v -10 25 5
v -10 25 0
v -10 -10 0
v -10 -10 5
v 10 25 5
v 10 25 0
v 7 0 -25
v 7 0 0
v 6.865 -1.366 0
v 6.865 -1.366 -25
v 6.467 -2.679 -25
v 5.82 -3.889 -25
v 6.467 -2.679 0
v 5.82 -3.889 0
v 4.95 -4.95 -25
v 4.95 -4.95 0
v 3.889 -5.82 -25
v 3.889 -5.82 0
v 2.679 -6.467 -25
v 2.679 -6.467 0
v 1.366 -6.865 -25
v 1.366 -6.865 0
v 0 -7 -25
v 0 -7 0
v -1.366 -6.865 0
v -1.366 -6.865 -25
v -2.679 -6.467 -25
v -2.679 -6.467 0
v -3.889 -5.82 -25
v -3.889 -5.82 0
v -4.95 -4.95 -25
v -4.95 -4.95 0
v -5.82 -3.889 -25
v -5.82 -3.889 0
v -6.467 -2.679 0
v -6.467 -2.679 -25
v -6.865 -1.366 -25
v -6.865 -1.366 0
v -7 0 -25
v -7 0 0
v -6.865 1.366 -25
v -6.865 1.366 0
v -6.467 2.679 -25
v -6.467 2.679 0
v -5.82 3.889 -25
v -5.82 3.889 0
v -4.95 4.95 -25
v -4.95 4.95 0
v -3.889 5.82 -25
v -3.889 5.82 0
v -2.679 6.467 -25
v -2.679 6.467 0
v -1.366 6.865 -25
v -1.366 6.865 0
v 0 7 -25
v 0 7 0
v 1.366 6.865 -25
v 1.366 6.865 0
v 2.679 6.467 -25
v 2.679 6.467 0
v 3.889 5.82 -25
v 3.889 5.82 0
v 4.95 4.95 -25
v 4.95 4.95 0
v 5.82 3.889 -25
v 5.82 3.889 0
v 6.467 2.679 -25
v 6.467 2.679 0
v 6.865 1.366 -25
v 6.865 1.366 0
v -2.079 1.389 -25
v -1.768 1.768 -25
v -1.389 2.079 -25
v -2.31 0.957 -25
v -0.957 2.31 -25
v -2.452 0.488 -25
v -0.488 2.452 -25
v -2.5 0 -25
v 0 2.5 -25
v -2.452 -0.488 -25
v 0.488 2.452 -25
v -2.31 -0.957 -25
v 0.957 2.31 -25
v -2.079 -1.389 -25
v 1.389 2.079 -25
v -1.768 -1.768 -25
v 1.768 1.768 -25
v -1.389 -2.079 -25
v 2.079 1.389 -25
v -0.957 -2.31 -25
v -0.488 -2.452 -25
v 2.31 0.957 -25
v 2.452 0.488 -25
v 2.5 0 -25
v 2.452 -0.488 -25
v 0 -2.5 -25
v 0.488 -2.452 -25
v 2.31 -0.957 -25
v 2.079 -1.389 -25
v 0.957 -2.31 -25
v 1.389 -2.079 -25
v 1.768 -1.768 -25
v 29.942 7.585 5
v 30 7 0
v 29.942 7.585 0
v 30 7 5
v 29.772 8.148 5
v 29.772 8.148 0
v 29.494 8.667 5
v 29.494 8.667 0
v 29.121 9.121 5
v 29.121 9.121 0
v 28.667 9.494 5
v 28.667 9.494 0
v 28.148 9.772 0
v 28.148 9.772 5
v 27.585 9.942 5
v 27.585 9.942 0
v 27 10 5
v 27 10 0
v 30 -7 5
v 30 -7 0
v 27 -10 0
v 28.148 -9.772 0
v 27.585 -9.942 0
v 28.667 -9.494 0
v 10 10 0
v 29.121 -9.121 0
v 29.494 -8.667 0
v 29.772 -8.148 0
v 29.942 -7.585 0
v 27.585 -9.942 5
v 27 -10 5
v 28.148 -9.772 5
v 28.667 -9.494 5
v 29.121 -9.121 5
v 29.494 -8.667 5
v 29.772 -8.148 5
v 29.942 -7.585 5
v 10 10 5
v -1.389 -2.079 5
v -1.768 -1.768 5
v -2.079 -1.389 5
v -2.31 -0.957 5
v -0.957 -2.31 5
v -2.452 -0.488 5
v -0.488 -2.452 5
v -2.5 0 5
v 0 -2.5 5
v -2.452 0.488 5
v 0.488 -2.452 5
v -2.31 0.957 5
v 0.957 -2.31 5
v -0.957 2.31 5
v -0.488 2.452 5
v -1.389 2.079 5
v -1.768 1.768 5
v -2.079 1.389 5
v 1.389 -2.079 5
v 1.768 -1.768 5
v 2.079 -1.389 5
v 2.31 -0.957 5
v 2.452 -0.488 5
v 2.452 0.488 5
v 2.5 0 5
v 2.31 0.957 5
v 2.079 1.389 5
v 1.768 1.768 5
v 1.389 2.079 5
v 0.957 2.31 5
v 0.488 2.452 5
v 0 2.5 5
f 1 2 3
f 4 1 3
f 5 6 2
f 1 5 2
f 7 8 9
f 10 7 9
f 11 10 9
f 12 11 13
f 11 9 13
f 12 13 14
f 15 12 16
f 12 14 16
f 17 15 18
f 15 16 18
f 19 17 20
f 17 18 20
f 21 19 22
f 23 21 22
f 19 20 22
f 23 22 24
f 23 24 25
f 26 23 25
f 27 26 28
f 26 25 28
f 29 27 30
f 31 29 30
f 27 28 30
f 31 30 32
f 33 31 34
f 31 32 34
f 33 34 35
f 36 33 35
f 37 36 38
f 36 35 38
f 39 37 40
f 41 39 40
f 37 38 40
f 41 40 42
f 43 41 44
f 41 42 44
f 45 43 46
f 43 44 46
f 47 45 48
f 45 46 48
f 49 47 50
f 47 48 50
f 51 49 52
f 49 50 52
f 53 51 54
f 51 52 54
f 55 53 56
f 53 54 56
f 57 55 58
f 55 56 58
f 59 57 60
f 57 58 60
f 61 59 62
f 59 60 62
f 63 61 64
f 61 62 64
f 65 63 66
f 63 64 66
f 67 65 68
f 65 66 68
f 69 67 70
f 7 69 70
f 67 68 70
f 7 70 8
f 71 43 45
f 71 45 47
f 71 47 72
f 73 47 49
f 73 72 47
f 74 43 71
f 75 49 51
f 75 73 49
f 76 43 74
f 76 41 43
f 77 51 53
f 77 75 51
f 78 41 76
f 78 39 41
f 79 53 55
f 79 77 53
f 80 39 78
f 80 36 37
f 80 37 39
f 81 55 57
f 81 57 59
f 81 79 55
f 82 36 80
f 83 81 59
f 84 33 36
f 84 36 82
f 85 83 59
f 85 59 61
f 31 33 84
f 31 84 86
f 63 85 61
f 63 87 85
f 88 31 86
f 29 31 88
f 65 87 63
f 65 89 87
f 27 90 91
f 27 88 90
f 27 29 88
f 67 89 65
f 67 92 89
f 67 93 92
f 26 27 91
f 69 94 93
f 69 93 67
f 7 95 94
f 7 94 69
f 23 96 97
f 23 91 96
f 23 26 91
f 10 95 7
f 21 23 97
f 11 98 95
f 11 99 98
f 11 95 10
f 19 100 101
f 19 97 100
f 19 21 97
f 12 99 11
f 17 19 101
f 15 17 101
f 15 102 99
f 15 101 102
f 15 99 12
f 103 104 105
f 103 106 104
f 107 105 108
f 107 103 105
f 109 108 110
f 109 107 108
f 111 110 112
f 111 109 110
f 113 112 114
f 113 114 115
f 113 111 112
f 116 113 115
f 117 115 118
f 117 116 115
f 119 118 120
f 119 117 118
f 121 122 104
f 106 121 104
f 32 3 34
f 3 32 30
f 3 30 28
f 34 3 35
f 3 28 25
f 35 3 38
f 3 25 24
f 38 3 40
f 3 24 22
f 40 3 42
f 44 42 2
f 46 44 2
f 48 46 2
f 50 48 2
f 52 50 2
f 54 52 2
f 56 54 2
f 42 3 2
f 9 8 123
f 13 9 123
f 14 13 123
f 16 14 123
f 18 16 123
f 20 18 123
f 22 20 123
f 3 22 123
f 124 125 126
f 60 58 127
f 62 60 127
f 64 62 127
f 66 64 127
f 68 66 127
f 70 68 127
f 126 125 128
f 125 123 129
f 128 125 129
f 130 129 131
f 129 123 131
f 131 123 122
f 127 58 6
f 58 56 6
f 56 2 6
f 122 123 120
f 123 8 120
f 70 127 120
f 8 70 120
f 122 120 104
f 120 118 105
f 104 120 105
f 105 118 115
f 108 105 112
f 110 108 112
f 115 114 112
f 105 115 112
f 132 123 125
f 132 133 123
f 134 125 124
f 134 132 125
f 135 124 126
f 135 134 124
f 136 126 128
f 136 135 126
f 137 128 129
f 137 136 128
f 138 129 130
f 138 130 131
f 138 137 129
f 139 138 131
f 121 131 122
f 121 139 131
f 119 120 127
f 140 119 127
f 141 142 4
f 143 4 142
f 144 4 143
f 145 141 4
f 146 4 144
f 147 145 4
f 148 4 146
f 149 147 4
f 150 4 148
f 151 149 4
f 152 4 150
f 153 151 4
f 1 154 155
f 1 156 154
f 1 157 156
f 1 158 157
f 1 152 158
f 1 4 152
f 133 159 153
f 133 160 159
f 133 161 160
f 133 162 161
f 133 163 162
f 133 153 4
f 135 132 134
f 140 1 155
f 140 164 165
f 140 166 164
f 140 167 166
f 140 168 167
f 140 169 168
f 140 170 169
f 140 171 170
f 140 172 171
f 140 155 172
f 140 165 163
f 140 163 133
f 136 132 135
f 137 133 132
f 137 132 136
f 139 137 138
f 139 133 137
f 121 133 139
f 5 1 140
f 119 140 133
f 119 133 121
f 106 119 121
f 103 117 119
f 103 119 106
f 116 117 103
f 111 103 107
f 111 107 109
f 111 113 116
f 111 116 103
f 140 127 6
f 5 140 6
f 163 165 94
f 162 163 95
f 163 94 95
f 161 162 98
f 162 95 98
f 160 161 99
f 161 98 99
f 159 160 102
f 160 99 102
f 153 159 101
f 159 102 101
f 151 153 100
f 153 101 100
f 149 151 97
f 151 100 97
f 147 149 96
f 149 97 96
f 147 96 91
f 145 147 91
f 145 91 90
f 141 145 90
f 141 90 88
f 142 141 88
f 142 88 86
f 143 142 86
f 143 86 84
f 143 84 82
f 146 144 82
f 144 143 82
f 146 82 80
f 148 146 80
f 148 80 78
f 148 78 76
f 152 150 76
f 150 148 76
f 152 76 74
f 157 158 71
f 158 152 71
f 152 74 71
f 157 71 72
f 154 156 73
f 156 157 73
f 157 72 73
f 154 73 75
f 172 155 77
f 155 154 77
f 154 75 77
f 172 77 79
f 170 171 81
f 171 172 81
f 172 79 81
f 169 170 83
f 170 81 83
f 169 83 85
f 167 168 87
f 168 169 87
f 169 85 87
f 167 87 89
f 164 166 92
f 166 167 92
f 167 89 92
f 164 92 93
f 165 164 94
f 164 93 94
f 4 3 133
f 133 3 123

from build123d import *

# Parameters (mm, degrees)
SKETCH_R     = 2.5
PAD_DEPTH    = 5
FILLET_R     = 3
SKETCH001_R  = 7
PAD001_DEPTH = 25
SKETCH002_R  = 2.5
POCKET_DEPTH = 30.001


with BuildPart() as part:
    # Sketch → Pad (new body)
    with BuildSketch(Plane.XY):
        Polygon((-10, -10), (30, -10), (30, 10), (10, 10), (10, 25), (-10, 25), align=None)
        Circle(SKETCH_R, mode=Mode.SUBTRACT)
    extrude(amount=PAD_DEPTH)

    # Fillet
    fillet_edges = [part.edges().sort_by_distance(p)[0] for p in [
        (30, 10, 2.5),
        (30, -10, 2.5),
    ]]
    fillet(fillet_edges, radius=FILLET_R)

    # Sketch001 → Pad001 (new body)
    with BuildSketch(Plane(origin=(0, 0, 0), x_dir=(1, 0, 0), z_dir=(0, 0, -1))):
        Circle(SKETCH001_R)
    extrude(amount=PAD001_DEPTH)

    # Sketch002 → Pocket (cut, through all)
    with BuildSketch(Plane(origin=(0, 0, -25), x_dir=(1, 0, 0), z_dir=(0, 0, -1))):
        Circle(SKETCH002_R)
    extrude(amount=-POCKET_DEPTH, mode=Mode.SUBTRACT)


solid = part.part
